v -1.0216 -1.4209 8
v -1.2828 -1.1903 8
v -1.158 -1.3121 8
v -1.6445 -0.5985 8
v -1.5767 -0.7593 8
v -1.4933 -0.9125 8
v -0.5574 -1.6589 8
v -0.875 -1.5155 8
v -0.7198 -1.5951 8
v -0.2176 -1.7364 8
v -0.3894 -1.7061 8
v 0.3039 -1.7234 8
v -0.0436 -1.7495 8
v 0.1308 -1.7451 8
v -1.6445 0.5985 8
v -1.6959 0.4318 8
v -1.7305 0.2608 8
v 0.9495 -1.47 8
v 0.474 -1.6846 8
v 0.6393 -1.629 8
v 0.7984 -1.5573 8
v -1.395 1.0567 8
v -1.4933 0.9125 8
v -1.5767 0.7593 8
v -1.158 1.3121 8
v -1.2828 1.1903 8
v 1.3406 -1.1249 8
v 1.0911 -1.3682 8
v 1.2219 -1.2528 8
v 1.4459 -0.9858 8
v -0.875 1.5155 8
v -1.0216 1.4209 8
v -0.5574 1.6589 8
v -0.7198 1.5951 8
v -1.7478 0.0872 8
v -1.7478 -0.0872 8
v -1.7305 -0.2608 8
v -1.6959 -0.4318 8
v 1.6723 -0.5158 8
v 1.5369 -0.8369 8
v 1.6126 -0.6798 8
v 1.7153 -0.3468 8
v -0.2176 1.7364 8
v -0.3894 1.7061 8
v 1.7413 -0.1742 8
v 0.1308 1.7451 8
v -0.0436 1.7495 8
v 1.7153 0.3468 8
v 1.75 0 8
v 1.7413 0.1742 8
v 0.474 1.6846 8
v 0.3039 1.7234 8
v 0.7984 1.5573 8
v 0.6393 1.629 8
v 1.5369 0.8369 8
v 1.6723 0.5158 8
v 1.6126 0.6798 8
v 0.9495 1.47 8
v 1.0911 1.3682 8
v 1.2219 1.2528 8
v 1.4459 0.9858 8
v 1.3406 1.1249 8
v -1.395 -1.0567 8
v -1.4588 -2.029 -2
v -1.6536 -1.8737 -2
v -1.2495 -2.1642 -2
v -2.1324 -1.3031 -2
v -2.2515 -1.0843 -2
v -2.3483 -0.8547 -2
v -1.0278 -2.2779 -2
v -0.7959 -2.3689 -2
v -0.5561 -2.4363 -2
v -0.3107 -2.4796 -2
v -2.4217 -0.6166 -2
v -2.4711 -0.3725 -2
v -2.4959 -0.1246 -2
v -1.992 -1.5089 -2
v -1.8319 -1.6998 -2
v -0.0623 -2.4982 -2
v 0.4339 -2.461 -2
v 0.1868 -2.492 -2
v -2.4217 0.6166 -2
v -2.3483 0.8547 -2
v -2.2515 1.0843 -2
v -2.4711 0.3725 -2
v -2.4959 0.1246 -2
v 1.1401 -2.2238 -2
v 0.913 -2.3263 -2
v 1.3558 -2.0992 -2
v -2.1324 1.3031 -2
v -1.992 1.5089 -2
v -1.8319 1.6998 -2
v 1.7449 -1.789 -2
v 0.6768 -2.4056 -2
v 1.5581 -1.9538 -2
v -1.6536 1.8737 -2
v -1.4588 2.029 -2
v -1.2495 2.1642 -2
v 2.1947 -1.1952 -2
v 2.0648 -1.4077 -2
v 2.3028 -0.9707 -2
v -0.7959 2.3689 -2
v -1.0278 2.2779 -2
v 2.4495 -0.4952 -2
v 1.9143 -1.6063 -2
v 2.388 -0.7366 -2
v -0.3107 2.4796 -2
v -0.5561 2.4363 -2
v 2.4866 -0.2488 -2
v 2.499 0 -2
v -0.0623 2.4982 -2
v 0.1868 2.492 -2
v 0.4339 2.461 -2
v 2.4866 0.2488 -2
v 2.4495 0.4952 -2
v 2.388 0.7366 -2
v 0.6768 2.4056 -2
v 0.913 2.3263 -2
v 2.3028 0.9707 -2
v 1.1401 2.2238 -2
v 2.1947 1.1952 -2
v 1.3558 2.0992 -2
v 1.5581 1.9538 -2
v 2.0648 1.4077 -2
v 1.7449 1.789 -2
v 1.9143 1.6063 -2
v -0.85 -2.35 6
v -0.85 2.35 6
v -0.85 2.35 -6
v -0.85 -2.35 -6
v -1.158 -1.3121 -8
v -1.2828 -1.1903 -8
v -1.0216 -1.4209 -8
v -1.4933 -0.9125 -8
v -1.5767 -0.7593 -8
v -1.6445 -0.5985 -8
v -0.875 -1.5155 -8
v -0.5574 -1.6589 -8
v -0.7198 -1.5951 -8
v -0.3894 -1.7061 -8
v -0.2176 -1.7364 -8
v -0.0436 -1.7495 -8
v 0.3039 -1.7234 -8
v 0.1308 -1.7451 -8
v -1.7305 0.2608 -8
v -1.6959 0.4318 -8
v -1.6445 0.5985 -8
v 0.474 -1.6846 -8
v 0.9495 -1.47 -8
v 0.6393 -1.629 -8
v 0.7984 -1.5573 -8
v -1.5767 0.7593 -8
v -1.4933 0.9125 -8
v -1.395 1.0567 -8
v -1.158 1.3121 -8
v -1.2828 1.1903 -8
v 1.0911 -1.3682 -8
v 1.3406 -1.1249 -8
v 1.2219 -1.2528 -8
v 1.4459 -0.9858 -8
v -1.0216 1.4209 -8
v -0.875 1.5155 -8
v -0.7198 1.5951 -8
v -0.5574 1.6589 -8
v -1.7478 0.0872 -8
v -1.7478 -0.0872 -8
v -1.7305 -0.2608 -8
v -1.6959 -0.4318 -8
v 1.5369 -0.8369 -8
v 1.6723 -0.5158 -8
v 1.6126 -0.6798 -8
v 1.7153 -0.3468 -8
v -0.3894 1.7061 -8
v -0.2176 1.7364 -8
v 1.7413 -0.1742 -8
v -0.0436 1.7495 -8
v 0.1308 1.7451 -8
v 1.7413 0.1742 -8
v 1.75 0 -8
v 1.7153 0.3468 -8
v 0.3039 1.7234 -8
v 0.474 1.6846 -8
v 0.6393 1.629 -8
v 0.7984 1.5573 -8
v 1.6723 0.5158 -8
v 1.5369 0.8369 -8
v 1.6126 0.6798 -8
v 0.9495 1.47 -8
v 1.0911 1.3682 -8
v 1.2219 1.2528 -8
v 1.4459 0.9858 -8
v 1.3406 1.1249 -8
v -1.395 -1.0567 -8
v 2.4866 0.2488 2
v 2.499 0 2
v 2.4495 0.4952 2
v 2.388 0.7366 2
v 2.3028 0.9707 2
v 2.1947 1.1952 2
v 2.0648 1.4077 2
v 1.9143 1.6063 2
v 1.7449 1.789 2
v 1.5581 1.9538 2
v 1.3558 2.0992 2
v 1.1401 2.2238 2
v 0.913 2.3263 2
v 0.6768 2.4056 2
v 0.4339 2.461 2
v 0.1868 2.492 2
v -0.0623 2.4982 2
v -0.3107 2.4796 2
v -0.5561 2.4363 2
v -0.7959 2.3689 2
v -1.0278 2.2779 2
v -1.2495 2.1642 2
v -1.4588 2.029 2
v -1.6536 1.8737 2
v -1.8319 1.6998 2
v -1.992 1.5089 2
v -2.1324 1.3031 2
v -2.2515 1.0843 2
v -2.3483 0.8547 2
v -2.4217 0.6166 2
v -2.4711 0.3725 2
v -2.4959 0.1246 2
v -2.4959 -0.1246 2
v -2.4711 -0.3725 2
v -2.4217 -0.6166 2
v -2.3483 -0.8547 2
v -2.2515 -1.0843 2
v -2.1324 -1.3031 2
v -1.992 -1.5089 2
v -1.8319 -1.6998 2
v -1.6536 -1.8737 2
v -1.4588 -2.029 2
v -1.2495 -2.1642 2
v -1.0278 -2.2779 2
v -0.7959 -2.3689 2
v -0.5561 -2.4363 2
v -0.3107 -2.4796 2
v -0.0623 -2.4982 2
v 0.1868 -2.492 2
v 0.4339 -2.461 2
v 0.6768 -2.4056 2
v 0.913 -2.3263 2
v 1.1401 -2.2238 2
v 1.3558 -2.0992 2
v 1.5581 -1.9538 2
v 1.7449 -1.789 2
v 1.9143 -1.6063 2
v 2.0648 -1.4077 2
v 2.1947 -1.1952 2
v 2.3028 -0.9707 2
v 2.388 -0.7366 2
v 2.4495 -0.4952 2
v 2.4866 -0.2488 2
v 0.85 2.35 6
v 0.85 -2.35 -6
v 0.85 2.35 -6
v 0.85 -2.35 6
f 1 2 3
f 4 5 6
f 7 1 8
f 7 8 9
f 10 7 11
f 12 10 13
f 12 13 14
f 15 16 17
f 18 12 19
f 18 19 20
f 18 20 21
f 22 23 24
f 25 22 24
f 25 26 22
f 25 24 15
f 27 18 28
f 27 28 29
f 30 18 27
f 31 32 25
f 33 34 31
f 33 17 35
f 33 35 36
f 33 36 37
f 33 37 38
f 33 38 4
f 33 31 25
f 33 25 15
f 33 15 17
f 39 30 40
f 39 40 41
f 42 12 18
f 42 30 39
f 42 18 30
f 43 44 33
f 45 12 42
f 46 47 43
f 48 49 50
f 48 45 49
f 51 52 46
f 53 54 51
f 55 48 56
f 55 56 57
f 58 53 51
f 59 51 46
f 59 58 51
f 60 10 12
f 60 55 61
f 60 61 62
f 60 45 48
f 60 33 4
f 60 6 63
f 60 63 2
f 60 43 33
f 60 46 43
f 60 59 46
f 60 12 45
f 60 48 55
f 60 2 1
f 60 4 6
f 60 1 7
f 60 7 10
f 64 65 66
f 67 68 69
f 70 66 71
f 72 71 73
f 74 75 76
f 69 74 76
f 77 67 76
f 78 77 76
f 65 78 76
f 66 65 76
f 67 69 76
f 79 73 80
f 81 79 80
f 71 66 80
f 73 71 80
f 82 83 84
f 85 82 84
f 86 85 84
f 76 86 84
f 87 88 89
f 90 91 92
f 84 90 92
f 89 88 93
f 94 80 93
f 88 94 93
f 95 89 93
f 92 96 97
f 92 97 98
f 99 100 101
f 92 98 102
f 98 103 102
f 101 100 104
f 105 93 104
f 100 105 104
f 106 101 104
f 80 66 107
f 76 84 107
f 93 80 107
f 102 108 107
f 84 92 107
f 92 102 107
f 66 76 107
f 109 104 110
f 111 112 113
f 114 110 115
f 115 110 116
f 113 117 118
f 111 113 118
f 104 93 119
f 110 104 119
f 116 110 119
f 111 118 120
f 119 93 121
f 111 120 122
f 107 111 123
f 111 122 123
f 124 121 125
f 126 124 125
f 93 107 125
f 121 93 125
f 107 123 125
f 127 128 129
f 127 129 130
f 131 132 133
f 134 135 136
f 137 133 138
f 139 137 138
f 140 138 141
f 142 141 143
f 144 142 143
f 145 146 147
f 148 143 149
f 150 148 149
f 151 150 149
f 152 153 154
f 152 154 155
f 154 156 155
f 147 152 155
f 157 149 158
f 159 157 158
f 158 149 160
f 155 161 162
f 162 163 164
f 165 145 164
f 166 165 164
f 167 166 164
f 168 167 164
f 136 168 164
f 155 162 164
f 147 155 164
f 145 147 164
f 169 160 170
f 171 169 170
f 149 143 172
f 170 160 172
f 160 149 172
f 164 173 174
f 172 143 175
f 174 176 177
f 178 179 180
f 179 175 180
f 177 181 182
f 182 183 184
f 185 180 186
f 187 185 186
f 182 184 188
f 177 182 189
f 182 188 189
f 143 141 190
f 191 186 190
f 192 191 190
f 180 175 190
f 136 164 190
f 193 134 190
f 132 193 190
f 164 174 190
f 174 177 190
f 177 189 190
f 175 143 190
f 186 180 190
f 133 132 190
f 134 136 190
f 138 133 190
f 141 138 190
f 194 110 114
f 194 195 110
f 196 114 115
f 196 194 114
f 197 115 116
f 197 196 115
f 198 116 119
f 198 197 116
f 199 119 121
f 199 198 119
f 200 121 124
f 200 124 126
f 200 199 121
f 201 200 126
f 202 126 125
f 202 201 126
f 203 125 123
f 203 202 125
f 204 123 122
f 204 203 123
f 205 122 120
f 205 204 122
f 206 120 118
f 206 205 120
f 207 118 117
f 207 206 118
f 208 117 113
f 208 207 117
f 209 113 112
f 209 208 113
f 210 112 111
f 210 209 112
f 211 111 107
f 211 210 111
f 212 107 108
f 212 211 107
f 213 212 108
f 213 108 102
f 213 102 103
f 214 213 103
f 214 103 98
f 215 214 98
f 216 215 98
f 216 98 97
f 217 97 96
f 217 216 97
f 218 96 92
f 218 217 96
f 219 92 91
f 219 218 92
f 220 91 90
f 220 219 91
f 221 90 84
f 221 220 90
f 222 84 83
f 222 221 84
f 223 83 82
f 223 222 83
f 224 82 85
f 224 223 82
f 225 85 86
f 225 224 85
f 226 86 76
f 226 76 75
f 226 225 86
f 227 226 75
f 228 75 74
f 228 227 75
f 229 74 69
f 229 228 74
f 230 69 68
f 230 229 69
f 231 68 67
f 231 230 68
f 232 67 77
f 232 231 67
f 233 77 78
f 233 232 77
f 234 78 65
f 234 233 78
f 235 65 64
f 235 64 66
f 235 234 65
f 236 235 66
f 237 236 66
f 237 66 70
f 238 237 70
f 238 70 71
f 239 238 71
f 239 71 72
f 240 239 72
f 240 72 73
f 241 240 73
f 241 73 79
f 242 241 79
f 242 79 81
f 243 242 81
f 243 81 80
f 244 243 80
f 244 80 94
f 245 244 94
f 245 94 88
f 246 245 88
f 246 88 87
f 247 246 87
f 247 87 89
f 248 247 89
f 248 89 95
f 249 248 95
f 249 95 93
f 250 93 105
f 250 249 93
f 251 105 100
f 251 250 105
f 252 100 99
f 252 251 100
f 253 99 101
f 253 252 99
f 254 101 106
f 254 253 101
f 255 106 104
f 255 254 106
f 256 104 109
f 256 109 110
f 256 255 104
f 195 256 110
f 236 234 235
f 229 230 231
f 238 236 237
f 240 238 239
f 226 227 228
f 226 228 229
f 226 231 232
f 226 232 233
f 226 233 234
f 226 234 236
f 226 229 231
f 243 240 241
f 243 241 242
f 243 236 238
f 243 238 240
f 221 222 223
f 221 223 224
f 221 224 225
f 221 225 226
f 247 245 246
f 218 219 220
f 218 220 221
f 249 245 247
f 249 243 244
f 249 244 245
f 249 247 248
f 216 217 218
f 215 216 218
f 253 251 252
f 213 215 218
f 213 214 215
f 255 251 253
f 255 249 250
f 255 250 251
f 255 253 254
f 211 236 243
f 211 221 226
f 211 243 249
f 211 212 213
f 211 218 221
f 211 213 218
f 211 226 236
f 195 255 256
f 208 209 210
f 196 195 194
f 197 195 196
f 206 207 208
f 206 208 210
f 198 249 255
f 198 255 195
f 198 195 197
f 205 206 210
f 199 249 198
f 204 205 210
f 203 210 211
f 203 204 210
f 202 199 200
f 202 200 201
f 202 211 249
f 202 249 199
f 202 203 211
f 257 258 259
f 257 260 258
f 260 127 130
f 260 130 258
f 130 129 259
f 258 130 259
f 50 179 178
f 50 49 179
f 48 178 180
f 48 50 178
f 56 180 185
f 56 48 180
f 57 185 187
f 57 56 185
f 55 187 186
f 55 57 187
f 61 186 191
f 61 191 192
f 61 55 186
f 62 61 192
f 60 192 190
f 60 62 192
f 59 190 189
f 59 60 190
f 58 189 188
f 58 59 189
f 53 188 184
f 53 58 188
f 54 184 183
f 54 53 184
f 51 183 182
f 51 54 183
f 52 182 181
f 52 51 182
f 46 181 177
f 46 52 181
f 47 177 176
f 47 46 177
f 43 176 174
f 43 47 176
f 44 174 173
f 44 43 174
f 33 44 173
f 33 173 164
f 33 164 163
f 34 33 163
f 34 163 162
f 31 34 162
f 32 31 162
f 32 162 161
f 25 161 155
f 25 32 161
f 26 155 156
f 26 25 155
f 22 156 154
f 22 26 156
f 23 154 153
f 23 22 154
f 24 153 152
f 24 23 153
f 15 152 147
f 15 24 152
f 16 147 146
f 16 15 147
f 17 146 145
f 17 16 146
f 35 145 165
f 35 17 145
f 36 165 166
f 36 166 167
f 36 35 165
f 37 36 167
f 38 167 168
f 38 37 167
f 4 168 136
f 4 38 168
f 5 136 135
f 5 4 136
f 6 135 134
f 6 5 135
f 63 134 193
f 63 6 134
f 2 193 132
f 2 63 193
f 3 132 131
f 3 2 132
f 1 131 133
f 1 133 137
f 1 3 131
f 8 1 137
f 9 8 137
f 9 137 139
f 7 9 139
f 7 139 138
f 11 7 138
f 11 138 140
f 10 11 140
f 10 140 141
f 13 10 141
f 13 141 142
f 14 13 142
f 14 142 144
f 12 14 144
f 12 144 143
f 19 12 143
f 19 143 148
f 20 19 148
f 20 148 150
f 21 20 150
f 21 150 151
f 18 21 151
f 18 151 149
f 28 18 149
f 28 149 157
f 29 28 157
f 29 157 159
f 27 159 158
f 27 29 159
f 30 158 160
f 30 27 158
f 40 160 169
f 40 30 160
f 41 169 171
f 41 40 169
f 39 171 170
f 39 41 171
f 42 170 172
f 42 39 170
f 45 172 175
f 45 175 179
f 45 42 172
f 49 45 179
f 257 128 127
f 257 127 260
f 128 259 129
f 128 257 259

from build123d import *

# Parameters (mm, degrees)
SKETCH1_R           = 2.4989998
BOSS_EXTRUDE1_DEPTH = 2
SKETCH1_4_W         = 1.7
SKETCH1_4_H         = 4.7
BOSS_EXTRUDE2_DEPTH = 6
SKETCH1_5_R         = 1.75
BOSS_EXTRUDE3_DEPTH = 8


with BuildPart() as part:
    # Sketch1 → Boss-Extrude1 (new, symmetric)
    with BuildSketch(Plane.XY):
        Circle(SKETCH1_R)
    extrude(amount=BOSS_EXTRUDE1_DEPTH, both=True)


with BuildPart() as body_2:
    # Sketch1<4> → Boss-Extrude2 (new, symmetric)
    with BuildSketch(Plane.XY):
        Rectangle(SKETCH1_4_W, SKETCH1_4_H)
    extrude(amount=BOSS_EXTRUDE2_DEPTH, both=True)


with BuildPart() as body_3:
    # Sketch1<5> → Boss-Extrude3 (new, symmetric)
    with BuildSketch(Plane.XY):
        Circle(SKETCH1_5_R)
    extrude(amount=BOSS_EXTRUDE3_DEPTH, both=True)


solid = Compound([part.part, body_2.part, body_3.part])
